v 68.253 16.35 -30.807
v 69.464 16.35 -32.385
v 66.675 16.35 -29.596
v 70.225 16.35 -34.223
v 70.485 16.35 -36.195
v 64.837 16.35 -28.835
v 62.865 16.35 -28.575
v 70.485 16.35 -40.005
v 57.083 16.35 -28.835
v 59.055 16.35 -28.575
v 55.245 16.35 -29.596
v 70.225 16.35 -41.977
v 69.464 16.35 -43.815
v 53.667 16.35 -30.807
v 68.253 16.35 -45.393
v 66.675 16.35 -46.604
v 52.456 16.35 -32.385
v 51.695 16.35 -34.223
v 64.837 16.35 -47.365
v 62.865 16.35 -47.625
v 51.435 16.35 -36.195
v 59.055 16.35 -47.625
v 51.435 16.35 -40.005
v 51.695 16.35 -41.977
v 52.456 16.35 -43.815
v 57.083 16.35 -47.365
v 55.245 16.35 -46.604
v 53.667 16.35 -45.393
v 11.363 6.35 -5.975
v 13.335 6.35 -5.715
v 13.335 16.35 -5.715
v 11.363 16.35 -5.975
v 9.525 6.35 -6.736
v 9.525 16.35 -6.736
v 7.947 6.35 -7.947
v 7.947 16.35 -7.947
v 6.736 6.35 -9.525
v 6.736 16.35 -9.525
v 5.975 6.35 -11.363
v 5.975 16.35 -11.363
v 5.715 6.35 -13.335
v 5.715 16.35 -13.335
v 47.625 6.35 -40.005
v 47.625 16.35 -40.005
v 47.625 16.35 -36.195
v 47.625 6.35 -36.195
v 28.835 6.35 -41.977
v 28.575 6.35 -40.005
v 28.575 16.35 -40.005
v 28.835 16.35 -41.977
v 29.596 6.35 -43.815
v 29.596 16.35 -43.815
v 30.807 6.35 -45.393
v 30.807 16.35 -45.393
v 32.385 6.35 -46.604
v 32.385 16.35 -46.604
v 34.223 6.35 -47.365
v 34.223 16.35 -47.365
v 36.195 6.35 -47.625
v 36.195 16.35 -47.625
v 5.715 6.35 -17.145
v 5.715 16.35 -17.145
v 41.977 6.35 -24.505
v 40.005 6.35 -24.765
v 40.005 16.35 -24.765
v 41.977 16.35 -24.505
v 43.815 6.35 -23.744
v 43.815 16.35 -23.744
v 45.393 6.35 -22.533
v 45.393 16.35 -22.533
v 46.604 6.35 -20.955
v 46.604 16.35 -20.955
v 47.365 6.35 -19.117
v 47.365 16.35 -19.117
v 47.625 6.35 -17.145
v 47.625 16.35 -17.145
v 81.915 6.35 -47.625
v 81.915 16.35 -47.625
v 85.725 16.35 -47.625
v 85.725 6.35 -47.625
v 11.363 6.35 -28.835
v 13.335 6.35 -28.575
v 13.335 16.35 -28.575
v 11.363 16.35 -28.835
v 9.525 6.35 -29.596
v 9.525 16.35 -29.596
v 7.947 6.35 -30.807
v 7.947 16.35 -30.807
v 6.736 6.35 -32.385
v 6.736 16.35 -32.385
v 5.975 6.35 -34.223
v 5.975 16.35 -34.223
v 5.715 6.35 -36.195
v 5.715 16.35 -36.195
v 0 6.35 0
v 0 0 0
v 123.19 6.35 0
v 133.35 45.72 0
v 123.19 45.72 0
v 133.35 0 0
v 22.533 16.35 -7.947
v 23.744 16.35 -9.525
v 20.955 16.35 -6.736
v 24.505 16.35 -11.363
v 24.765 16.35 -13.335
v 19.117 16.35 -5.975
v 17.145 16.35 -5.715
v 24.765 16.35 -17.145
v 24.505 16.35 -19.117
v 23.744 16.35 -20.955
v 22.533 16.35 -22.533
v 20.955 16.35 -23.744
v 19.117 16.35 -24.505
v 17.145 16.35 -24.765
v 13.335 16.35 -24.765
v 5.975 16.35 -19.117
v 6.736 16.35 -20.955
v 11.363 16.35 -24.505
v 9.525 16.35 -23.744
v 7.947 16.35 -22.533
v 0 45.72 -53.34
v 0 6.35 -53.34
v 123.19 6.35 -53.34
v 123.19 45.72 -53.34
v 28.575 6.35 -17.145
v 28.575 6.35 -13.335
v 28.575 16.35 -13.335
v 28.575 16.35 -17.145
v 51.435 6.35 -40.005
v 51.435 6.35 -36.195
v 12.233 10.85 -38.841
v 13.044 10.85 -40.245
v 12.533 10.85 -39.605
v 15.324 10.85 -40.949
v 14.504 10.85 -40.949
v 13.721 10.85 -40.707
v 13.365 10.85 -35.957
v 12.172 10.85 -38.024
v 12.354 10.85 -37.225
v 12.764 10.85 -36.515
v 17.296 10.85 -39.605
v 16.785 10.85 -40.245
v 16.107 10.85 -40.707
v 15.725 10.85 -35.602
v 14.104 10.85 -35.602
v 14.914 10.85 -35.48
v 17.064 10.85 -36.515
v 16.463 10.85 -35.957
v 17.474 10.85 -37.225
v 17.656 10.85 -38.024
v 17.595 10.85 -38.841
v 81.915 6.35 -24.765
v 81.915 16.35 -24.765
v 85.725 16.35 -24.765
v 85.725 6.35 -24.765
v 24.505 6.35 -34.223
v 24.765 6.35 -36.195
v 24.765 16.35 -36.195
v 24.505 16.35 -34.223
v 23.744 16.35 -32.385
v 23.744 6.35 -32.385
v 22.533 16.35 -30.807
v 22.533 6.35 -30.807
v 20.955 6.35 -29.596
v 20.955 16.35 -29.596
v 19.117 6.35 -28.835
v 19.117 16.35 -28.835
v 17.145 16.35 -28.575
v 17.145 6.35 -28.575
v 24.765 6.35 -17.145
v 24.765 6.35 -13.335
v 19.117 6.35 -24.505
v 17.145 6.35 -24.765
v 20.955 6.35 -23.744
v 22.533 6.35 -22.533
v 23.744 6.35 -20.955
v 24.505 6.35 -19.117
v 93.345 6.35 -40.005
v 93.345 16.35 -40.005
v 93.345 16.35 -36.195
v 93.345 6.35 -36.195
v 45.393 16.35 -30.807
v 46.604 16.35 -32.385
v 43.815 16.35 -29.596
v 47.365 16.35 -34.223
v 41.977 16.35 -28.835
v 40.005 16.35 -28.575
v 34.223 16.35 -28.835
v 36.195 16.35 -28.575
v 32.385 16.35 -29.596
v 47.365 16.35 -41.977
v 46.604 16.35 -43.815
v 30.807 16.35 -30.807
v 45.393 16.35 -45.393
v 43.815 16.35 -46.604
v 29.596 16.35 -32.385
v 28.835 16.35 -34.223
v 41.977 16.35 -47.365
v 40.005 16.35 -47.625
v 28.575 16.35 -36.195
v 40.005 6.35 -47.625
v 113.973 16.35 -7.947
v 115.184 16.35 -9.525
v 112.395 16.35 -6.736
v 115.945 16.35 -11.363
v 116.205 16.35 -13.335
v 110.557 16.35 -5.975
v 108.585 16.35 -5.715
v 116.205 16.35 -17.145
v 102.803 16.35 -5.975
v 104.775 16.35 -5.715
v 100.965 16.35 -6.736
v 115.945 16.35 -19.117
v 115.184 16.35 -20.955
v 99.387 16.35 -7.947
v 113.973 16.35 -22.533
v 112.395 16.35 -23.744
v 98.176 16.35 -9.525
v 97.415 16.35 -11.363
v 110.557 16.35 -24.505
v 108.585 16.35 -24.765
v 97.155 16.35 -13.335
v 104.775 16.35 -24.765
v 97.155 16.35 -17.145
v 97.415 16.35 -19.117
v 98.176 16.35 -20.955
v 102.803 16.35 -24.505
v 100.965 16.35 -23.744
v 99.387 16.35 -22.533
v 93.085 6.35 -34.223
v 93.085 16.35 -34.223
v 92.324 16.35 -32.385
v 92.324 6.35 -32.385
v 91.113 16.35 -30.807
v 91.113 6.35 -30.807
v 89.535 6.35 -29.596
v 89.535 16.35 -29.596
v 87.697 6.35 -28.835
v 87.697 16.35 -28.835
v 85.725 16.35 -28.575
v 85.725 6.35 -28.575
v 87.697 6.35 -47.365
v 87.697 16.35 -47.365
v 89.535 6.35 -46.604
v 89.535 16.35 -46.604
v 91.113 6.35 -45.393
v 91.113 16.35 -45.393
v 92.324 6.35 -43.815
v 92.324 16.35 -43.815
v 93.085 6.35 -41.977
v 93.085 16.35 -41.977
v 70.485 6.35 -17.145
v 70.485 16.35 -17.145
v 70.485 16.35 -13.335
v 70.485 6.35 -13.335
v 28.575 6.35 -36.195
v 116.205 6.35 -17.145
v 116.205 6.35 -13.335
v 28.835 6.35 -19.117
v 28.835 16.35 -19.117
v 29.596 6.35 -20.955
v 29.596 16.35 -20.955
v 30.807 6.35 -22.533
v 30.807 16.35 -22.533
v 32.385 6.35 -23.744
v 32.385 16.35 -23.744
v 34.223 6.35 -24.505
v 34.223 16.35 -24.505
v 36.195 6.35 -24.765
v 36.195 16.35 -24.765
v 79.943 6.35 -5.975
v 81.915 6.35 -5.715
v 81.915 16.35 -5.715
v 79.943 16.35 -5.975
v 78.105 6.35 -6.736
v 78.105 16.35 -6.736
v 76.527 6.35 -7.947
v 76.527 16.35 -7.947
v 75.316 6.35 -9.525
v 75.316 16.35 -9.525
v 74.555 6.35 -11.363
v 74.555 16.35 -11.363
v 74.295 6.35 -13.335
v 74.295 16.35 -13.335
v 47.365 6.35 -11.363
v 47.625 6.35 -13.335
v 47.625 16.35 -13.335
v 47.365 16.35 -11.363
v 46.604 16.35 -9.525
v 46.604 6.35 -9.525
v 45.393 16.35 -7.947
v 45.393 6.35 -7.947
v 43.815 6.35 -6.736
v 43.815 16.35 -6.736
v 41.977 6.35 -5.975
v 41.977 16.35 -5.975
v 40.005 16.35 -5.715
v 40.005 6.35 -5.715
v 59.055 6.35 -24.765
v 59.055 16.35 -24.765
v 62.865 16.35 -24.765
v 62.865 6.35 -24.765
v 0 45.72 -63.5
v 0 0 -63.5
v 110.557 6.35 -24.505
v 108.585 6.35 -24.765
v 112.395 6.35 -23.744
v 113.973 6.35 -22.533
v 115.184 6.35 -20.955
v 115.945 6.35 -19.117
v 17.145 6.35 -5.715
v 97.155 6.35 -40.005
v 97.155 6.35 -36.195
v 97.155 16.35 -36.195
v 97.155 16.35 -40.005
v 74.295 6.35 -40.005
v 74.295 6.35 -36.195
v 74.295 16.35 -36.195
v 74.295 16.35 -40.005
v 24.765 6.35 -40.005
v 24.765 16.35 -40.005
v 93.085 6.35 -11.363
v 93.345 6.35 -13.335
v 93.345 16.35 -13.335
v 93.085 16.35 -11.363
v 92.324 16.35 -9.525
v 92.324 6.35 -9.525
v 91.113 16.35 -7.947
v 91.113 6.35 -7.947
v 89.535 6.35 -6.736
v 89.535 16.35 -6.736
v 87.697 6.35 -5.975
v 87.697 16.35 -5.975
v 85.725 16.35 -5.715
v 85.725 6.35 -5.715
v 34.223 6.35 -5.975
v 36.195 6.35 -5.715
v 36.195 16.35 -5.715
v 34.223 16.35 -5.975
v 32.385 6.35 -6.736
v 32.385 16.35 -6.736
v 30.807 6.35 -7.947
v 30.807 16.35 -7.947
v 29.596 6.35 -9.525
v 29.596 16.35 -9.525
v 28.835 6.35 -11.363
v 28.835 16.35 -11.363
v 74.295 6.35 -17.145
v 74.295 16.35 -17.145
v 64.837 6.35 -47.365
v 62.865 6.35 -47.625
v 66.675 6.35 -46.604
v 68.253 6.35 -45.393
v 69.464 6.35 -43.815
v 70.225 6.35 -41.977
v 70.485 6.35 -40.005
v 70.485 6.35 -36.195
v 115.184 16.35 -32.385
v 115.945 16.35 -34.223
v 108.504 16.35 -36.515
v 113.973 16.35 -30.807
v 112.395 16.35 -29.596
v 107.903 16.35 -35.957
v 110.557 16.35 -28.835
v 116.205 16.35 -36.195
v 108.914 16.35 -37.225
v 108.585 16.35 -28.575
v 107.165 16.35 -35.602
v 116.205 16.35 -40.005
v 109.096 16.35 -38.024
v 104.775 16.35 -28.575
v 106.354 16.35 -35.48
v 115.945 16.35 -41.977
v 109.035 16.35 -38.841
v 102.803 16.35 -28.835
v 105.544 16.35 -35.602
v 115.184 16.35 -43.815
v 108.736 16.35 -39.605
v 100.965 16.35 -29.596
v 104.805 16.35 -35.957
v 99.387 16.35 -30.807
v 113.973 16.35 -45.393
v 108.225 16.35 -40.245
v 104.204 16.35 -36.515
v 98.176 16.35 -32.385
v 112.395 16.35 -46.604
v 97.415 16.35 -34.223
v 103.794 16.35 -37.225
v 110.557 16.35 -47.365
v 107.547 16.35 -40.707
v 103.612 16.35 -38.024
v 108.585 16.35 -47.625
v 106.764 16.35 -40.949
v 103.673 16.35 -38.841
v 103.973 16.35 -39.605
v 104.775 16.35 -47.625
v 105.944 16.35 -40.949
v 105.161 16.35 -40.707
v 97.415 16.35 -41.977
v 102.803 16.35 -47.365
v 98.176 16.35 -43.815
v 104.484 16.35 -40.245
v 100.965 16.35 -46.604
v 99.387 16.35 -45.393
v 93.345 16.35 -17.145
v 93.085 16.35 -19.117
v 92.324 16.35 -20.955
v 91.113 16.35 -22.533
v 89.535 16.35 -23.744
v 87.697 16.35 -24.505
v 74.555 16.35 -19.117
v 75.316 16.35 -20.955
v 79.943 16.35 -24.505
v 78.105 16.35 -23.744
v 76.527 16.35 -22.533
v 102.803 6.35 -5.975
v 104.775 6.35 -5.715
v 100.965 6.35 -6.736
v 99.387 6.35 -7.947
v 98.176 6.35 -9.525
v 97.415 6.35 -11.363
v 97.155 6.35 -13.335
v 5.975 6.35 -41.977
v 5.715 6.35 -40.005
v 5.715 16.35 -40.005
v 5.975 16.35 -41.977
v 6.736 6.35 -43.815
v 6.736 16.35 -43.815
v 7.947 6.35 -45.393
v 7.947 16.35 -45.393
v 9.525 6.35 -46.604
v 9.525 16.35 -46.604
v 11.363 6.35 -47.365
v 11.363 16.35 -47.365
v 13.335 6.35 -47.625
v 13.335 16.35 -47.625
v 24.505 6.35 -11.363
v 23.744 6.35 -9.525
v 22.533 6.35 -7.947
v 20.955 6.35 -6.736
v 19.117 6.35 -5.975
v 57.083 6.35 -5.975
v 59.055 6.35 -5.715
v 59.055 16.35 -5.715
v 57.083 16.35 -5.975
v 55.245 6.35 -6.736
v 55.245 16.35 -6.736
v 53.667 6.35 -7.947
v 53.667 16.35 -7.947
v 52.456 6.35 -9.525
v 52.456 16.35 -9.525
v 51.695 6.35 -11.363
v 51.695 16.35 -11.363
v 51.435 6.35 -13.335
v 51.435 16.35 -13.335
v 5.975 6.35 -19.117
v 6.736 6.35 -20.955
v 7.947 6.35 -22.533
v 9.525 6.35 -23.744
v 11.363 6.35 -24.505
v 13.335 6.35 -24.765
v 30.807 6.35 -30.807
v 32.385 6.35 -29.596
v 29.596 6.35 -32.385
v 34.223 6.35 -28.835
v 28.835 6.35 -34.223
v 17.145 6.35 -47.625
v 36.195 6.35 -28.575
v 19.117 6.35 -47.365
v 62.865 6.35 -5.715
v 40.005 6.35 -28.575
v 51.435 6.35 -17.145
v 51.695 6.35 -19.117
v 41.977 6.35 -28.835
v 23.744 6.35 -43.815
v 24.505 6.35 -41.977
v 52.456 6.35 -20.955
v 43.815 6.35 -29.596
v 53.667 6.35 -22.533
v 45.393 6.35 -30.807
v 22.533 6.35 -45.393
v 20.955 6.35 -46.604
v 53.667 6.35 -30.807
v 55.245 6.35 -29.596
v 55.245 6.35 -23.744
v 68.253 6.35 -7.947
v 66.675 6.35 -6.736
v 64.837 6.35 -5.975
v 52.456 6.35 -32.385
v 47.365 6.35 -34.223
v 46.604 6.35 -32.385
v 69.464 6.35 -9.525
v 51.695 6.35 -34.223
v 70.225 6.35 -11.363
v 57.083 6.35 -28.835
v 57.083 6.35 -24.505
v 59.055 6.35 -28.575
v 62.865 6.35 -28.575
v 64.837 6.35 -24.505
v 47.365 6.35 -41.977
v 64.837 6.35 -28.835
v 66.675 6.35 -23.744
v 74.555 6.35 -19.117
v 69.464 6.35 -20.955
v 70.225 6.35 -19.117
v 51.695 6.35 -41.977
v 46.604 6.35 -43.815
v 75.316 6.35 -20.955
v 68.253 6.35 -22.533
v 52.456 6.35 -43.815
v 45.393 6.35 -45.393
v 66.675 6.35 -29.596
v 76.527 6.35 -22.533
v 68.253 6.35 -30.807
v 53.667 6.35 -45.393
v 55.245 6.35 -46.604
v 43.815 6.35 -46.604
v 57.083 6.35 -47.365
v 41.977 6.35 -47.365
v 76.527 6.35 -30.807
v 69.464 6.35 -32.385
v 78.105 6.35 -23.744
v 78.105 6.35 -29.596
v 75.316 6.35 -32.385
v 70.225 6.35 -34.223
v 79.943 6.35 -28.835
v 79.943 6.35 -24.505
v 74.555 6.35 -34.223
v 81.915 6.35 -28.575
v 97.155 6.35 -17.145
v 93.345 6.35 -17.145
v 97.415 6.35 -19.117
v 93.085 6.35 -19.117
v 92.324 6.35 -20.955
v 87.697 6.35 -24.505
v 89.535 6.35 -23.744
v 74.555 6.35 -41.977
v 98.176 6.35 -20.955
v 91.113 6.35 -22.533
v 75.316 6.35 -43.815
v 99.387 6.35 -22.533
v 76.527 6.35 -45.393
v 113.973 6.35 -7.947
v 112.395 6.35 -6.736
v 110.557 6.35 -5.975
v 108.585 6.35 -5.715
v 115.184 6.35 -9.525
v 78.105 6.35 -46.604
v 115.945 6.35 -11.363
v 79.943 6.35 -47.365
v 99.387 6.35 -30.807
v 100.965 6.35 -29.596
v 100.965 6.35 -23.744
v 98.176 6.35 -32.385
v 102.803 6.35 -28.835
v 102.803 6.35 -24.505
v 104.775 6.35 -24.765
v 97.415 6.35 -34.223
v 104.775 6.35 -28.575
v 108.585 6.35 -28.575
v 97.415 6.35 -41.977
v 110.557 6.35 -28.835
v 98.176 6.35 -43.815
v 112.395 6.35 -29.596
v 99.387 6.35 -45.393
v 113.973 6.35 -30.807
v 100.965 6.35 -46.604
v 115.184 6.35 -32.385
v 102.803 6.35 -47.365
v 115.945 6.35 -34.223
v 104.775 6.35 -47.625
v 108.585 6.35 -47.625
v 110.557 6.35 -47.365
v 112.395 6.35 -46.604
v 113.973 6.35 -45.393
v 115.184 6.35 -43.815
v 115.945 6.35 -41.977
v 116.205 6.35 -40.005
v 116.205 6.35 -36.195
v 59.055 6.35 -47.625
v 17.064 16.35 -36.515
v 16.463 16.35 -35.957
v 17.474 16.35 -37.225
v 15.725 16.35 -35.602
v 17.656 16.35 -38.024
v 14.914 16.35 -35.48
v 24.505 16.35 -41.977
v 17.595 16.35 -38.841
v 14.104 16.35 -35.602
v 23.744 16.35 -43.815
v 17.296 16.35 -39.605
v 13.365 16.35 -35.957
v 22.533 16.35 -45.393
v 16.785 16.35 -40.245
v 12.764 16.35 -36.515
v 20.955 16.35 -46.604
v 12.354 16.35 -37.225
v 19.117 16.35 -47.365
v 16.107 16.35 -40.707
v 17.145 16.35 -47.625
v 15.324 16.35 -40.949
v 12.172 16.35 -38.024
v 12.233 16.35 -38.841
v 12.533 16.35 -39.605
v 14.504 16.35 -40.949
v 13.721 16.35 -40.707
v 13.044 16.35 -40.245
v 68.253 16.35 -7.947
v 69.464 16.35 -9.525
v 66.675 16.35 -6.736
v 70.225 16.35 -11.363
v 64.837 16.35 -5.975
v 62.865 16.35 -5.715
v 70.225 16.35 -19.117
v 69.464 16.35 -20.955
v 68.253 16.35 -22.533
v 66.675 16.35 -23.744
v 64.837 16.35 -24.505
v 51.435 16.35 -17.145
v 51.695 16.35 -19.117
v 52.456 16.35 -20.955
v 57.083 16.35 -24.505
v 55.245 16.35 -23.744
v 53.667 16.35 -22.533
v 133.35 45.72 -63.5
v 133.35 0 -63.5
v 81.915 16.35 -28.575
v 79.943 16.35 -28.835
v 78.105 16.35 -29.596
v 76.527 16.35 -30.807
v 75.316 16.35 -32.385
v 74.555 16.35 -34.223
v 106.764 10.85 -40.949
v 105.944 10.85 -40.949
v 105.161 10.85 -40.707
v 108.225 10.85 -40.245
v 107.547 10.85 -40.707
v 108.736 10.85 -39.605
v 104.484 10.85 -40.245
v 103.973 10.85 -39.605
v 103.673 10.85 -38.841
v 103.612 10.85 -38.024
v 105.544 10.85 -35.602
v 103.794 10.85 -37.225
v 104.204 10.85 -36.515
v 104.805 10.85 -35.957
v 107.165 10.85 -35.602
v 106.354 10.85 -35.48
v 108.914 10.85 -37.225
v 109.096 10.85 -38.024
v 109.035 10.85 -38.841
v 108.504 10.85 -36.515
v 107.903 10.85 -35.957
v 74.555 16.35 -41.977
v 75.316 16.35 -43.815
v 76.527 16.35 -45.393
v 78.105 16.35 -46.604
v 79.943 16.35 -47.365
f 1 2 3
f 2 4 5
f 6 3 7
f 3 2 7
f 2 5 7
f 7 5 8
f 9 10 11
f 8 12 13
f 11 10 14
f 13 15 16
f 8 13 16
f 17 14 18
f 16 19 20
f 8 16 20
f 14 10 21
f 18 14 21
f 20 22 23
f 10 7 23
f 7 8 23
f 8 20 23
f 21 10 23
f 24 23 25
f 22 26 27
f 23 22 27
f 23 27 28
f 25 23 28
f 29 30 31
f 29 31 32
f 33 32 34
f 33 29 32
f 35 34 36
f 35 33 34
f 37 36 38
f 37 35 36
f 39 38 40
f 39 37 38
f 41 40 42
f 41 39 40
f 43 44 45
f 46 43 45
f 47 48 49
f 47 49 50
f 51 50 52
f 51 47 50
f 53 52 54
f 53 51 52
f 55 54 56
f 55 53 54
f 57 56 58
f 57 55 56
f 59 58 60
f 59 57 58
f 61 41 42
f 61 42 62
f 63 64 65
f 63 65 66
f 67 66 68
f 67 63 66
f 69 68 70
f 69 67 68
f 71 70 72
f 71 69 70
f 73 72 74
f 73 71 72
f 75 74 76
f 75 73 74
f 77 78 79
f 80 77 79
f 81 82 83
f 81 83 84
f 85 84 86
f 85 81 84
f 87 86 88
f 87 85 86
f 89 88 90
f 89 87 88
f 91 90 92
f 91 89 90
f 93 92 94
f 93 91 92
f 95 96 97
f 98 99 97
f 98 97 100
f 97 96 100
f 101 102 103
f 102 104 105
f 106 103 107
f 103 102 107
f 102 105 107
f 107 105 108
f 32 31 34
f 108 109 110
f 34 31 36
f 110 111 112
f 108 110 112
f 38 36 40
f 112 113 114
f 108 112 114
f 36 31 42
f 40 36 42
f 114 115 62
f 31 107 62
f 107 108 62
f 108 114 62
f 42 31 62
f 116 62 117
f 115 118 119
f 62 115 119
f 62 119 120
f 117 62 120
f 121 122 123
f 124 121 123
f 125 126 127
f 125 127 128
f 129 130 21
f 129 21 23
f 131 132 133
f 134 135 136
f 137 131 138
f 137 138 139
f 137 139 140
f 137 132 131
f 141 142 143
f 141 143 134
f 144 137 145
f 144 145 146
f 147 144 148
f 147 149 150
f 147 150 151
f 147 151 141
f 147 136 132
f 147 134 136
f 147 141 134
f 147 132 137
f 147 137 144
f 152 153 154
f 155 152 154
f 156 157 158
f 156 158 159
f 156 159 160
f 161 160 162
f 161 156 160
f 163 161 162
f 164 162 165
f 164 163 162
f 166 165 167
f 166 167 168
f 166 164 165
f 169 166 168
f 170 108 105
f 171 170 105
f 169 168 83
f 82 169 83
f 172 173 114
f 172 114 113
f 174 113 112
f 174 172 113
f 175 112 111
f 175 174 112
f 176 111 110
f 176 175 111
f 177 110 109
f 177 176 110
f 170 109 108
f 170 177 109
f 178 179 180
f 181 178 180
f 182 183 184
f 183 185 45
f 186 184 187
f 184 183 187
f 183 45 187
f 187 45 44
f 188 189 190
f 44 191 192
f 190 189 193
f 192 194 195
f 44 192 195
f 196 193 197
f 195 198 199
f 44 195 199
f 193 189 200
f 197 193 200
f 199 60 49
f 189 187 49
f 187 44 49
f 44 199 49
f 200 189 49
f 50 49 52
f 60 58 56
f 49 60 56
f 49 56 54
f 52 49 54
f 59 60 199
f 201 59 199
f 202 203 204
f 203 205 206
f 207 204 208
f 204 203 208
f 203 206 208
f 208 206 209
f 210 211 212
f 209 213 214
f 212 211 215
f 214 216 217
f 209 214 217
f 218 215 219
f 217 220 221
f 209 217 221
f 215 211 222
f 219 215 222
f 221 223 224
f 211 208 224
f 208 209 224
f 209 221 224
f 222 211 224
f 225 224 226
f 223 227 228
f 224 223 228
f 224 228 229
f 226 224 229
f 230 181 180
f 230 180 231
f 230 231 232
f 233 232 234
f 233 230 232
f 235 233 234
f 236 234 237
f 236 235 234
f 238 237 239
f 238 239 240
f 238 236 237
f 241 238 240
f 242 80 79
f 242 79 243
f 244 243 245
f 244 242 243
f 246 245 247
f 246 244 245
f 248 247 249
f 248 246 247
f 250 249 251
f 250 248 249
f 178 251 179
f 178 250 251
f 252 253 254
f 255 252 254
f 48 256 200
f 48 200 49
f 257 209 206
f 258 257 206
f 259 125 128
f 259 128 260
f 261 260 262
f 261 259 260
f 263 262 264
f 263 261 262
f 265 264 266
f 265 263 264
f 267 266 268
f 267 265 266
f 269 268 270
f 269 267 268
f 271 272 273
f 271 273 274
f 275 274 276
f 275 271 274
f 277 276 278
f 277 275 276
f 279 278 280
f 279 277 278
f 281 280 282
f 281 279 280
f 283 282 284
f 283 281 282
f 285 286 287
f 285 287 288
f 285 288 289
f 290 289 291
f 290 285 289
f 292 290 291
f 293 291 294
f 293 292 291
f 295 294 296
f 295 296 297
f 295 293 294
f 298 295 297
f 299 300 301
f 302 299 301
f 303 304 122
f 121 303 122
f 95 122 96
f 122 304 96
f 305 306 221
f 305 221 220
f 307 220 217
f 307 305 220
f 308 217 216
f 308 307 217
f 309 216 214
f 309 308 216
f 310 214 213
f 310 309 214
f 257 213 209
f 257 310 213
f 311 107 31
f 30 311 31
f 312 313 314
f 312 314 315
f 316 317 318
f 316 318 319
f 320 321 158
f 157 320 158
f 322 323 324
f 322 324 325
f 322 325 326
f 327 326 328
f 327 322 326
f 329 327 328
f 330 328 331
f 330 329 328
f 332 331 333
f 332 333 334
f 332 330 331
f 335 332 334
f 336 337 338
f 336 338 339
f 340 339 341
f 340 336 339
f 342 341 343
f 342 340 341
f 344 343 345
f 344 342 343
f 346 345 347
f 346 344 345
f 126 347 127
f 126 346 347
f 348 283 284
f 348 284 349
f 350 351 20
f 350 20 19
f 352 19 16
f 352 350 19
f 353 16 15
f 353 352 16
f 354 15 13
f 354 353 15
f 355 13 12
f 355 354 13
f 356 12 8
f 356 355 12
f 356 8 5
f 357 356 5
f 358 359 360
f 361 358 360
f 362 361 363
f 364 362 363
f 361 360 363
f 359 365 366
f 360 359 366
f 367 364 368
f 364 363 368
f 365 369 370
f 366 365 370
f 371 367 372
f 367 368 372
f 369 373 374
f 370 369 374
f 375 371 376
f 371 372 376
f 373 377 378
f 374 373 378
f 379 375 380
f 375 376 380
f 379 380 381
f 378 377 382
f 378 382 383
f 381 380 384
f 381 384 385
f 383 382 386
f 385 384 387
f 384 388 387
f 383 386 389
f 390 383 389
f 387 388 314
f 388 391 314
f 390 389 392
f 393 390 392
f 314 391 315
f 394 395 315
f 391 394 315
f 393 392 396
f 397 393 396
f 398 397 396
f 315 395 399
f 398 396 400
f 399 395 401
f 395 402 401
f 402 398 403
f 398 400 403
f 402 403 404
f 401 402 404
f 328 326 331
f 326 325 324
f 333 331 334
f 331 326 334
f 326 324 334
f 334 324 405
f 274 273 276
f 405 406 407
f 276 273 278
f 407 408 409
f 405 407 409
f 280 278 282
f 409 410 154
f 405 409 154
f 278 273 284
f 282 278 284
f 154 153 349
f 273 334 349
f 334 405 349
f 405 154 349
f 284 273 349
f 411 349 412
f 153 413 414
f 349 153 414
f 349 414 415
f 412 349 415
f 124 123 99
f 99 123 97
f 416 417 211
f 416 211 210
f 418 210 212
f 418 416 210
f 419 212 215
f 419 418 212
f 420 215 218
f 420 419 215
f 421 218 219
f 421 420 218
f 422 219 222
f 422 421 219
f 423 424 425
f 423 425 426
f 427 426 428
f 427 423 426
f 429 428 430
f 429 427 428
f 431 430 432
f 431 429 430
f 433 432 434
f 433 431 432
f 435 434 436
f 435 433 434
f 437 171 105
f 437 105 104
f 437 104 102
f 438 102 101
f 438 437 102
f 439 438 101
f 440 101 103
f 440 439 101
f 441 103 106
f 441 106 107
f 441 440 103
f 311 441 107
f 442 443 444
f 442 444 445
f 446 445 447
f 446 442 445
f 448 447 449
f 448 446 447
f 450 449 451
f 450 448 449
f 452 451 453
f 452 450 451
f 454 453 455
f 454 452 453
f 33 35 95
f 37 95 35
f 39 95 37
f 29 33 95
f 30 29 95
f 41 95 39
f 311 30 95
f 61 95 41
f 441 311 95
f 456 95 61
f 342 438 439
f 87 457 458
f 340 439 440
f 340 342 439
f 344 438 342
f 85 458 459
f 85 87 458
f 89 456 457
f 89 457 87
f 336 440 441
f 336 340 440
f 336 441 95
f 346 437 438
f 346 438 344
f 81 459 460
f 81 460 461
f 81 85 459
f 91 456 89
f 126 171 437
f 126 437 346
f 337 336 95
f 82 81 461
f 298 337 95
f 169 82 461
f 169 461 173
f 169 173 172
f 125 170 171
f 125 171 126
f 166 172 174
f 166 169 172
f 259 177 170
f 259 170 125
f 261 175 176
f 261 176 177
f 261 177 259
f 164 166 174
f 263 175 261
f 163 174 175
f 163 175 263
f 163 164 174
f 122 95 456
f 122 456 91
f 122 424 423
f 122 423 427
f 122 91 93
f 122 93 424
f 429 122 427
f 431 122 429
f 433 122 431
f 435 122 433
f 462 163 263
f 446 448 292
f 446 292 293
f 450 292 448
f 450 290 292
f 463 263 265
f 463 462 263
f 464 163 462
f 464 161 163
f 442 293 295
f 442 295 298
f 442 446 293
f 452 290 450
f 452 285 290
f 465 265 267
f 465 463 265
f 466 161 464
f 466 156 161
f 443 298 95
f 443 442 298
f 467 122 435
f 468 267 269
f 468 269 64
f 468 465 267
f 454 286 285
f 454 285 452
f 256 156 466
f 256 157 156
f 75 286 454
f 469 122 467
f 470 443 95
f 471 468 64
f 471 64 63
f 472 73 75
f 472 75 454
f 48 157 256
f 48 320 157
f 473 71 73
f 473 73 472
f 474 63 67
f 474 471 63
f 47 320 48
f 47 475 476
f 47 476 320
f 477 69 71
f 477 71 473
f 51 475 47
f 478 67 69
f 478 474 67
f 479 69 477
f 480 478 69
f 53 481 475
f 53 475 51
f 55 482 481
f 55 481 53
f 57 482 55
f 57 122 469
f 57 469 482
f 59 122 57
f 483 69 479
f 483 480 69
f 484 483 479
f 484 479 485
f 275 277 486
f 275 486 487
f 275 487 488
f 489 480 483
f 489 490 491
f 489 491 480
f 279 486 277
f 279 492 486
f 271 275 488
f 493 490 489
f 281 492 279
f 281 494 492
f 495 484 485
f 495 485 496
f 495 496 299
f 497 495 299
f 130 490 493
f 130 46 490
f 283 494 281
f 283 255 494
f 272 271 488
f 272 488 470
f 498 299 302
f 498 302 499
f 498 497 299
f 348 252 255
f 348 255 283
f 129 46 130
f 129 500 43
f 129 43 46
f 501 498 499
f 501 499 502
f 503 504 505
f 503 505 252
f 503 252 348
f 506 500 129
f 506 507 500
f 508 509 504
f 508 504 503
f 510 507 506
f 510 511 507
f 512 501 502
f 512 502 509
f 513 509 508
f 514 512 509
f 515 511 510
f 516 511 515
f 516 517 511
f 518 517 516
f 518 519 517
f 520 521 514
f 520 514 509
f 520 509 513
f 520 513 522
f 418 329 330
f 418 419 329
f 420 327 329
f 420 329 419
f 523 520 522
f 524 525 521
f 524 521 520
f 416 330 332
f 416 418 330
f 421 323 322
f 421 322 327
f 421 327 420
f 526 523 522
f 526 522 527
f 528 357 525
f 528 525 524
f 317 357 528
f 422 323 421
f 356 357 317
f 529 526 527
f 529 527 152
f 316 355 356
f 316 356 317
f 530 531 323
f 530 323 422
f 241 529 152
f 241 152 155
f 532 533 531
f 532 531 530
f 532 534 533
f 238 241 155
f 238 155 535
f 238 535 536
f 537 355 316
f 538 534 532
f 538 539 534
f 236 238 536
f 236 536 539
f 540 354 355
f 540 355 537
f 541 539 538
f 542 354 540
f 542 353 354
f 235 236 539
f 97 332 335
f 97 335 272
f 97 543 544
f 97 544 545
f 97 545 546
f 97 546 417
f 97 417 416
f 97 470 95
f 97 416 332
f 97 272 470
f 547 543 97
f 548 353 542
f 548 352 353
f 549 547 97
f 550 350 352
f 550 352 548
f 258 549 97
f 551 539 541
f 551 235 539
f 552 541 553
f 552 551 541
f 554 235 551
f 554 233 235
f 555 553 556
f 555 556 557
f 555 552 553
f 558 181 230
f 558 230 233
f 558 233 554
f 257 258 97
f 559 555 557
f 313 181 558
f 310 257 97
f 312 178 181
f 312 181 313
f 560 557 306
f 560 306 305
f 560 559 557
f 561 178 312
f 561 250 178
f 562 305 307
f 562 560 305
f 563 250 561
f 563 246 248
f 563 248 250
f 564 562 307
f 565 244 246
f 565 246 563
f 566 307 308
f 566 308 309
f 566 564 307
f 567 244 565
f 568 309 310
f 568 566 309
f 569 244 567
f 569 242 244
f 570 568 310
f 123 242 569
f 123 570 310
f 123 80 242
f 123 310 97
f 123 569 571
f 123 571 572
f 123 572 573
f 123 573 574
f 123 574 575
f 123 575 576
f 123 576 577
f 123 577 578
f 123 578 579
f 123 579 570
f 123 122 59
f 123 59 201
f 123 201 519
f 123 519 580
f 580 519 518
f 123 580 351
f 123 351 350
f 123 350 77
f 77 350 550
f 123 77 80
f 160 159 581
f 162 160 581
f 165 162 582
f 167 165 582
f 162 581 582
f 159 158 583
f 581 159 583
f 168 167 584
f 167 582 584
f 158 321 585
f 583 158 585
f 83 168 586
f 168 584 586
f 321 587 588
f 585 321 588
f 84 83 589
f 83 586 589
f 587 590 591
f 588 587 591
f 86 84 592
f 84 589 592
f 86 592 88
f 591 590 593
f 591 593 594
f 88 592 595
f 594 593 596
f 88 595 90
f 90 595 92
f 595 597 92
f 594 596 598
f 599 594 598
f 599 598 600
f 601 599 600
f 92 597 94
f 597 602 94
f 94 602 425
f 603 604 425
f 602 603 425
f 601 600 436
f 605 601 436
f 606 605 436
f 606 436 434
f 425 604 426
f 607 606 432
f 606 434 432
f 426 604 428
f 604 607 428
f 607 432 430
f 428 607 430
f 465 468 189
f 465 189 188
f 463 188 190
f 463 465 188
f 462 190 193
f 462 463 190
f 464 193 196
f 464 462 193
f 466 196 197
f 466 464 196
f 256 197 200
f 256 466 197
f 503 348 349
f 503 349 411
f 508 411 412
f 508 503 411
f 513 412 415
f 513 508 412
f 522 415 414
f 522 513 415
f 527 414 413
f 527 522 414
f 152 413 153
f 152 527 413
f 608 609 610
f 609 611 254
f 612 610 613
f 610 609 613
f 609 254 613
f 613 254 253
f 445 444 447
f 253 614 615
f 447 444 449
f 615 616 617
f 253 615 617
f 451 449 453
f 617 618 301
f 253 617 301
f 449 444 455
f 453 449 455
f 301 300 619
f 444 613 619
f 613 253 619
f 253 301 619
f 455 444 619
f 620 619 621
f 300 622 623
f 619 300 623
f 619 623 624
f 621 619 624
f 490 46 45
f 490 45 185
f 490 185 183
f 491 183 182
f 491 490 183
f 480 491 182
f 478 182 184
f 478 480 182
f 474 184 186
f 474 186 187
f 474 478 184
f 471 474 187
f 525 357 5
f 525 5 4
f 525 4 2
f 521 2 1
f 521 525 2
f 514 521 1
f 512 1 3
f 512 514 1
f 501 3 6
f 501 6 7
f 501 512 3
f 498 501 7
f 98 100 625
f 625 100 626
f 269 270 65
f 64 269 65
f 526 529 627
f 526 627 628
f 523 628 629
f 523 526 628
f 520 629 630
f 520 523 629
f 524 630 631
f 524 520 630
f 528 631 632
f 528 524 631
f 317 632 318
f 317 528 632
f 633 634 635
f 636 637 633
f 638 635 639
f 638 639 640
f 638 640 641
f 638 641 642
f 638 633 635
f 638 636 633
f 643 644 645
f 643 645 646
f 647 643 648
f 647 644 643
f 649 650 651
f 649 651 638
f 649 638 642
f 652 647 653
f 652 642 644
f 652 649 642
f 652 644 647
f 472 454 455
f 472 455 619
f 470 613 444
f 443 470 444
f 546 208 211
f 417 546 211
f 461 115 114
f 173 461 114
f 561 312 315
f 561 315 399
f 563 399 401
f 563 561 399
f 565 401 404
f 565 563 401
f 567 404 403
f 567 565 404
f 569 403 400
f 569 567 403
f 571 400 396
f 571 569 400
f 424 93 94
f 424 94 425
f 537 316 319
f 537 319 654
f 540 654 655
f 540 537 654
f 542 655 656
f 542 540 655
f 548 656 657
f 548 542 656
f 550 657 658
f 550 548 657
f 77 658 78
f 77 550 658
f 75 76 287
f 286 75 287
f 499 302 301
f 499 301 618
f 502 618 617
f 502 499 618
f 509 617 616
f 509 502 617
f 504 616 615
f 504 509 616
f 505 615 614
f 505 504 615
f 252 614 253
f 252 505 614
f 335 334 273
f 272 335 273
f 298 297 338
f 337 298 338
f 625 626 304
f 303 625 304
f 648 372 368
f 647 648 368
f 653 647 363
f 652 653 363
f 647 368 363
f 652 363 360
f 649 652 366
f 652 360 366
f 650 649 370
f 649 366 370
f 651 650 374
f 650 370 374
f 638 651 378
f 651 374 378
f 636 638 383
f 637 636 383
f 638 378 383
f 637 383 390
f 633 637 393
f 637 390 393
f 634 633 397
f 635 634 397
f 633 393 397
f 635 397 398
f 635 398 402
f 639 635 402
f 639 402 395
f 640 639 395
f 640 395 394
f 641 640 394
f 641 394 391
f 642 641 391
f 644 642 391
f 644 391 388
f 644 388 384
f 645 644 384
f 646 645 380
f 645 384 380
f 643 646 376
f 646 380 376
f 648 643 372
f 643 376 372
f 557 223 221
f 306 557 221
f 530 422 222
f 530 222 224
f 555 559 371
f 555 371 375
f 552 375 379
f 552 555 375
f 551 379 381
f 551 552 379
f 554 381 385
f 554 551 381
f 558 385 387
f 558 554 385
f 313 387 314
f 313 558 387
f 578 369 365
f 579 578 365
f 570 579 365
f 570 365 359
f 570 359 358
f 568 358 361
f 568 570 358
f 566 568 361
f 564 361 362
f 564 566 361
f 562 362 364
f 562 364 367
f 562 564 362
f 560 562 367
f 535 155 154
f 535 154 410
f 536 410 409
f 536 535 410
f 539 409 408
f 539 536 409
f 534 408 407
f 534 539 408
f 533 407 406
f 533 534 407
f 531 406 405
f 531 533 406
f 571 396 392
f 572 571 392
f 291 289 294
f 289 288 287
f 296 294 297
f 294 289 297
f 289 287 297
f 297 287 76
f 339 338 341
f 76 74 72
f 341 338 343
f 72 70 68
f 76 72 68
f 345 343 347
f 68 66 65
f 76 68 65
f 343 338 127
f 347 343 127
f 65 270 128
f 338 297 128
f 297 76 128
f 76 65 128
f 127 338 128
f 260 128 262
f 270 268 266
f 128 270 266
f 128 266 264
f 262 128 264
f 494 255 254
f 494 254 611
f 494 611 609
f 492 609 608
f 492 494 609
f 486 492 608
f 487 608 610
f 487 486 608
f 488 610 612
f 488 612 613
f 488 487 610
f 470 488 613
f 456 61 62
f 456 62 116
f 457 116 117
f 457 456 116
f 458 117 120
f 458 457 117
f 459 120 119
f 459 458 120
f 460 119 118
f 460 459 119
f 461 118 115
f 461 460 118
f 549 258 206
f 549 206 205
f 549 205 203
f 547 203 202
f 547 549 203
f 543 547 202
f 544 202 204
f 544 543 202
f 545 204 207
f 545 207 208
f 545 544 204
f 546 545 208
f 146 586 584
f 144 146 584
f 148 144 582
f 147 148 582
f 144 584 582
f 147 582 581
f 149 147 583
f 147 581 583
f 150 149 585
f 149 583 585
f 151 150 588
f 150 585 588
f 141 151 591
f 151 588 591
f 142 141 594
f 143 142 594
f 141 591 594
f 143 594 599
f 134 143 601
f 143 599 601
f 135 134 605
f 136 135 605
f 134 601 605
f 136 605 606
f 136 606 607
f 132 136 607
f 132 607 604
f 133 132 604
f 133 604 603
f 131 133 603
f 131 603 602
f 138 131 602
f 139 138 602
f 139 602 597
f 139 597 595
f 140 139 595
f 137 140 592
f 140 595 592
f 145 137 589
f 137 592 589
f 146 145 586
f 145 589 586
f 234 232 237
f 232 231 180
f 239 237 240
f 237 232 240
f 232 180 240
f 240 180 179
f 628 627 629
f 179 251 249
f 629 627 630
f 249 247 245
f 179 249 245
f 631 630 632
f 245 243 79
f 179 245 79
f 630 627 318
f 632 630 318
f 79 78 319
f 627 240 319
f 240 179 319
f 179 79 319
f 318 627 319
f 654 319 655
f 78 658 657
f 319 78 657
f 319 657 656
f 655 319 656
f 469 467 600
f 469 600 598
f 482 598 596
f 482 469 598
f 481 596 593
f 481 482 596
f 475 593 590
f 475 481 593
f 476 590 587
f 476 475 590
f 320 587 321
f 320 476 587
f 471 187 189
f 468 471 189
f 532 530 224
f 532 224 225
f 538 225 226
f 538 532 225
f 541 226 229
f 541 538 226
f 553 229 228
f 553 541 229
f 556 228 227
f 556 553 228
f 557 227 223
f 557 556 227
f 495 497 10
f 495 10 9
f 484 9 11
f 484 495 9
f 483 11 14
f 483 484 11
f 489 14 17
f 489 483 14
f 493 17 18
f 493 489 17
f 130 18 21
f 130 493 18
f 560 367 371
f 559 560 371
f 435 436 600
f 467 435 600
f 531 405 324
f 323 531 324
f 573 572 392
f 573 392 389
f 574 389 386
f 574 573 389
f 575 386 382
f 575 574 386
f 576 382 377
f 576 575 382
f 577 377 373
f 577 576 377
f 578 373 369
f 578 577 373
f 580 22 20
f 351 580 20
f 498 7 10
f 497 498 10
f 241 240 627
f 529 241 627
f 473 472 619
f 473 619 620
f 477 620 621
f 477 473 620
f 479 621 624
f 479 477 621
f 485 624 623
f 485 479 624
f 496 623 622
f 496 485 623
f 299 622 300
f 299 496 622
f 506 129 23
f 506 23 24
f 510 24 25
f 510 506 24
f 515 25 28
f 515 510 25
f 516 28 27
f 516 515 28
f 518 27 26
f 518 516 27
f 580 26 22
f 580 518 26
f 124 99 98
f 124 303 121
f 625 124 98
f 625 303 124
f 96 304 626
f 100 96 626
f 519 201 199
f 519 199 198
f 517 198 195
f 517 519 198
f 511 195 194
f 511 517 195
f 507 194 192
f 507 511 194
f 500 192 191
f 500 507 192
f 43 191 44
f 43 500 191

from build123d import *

# Parameters (mm, degrees)
SKETCH2_W            = 133.35
SKETCH2_H            = 63.5
BOSS_EXTRUDE2_DEPTH  = 6.35
BOSS_EXTRUDE3_DEPTH  = 45.72
BOSS_EXTRUDE1_DEPTH  = 10
LPATTERN1_COUNT      = 5
LPATTERN1_PITCH      = 22.86
LPATTERN1_COUNT_DIR2 = 2
LPATTERN1_PITCH_DIR2 = 22.86
SKETCH6_R            = 2.75
CUT_EXTRUDE1_DEPTH   = 5.5


with BuildPart() as part:
    # Sketch2 → Boss-Extrude2 (new body)
    with BuildSketch(Plane(origin=(0, 0, 0), x_dir=(1, 0, 0), z_dir=(0, 1, 0))):
        with Locations((66.675, 31.75)):
            Rectangle(SKETCH2_W, SKETCH2_H)
    extrude(amount=BOSS_EXTRUDE2_DEPTH)

    # Sketch2<4> → Boss-Extrude3 (add)
    with BuildSketch(Plane(origin=(0, 0, 0), x_dir=(1, 0, 0), z_dir=(0, 1, 0))):
        Polygon((123.19, 53.34), (123.19, 0), (133.35, 0), (133.35, 63.5), (0, 63.5), (0, 53.34), align=None)
    extrude(amount=BOSS_EXTRUDE3_DEPTH)

    # Sketch1 → Boss-Extrude1 (add)
    with BuildSketch(Plane(origin=(0, 6.35, 6.35), x_dir=(1, 0, 0), z_dir=(0, 1, 0))):
        with BuildLine():
            Line((13.335, 31.115), (17.145, 31.115))
            ThreePointArc((17.145, 31.115), (22.533153673, 28.883153673), (24.765, 23.495))
            Line((24.765, 23.495), (24.765, 19.685))
            ThreePointArc((24.765, 19.685), (22.533153673, 14.296846327), (17.145, 12.065))
            Line((17.145, 12.065), (13.335, 12.065))
            ThreePointArc((13.335, 12.065), (7.946846327, 14.296846327), (5.715, 19.685))
            Line((5.715, 19.685), (5.715, 23.495))
            ThreePointArc((5.715, 23.495), (7.946846327, 28.883153673), (13.335, 31.115))
        make_face()
    boss_extrude1 = extrude(amount=BOSS_EXTRUDE1_DEPTH)

    # LPattern1: Boss-Extrude1 5 × 2
    with Locations(*[(i * LPATTERN1_PITCH, 0, -j * LPATTERN1_PITCH_DIR2) for i in range(LPATTERN1_COUNT) for j in range(LPATTERN1_COUNT_DIR2) if (i, j) != (0, 0)]):
        add(boss_extrude1)

    # Sketch6 → Cut-Extrude1 (cut)
    with BuildSketch(Plane(origin=(0, 16.35, 0), x_dir=(1, 0, 0), z_dir=(0, 1, 0))):
        with Locations((106.354086264, 38.229532142)):
            Circle(SKETCH6_R)
        with Locations((14.914086264, 38.229532142)):
            Circle(SKETCH6_R)
    extrude(amount=-CUT_EXTRUDE1_DEPTH, mode=Mode.SUBTRACT)


solid = part.part
